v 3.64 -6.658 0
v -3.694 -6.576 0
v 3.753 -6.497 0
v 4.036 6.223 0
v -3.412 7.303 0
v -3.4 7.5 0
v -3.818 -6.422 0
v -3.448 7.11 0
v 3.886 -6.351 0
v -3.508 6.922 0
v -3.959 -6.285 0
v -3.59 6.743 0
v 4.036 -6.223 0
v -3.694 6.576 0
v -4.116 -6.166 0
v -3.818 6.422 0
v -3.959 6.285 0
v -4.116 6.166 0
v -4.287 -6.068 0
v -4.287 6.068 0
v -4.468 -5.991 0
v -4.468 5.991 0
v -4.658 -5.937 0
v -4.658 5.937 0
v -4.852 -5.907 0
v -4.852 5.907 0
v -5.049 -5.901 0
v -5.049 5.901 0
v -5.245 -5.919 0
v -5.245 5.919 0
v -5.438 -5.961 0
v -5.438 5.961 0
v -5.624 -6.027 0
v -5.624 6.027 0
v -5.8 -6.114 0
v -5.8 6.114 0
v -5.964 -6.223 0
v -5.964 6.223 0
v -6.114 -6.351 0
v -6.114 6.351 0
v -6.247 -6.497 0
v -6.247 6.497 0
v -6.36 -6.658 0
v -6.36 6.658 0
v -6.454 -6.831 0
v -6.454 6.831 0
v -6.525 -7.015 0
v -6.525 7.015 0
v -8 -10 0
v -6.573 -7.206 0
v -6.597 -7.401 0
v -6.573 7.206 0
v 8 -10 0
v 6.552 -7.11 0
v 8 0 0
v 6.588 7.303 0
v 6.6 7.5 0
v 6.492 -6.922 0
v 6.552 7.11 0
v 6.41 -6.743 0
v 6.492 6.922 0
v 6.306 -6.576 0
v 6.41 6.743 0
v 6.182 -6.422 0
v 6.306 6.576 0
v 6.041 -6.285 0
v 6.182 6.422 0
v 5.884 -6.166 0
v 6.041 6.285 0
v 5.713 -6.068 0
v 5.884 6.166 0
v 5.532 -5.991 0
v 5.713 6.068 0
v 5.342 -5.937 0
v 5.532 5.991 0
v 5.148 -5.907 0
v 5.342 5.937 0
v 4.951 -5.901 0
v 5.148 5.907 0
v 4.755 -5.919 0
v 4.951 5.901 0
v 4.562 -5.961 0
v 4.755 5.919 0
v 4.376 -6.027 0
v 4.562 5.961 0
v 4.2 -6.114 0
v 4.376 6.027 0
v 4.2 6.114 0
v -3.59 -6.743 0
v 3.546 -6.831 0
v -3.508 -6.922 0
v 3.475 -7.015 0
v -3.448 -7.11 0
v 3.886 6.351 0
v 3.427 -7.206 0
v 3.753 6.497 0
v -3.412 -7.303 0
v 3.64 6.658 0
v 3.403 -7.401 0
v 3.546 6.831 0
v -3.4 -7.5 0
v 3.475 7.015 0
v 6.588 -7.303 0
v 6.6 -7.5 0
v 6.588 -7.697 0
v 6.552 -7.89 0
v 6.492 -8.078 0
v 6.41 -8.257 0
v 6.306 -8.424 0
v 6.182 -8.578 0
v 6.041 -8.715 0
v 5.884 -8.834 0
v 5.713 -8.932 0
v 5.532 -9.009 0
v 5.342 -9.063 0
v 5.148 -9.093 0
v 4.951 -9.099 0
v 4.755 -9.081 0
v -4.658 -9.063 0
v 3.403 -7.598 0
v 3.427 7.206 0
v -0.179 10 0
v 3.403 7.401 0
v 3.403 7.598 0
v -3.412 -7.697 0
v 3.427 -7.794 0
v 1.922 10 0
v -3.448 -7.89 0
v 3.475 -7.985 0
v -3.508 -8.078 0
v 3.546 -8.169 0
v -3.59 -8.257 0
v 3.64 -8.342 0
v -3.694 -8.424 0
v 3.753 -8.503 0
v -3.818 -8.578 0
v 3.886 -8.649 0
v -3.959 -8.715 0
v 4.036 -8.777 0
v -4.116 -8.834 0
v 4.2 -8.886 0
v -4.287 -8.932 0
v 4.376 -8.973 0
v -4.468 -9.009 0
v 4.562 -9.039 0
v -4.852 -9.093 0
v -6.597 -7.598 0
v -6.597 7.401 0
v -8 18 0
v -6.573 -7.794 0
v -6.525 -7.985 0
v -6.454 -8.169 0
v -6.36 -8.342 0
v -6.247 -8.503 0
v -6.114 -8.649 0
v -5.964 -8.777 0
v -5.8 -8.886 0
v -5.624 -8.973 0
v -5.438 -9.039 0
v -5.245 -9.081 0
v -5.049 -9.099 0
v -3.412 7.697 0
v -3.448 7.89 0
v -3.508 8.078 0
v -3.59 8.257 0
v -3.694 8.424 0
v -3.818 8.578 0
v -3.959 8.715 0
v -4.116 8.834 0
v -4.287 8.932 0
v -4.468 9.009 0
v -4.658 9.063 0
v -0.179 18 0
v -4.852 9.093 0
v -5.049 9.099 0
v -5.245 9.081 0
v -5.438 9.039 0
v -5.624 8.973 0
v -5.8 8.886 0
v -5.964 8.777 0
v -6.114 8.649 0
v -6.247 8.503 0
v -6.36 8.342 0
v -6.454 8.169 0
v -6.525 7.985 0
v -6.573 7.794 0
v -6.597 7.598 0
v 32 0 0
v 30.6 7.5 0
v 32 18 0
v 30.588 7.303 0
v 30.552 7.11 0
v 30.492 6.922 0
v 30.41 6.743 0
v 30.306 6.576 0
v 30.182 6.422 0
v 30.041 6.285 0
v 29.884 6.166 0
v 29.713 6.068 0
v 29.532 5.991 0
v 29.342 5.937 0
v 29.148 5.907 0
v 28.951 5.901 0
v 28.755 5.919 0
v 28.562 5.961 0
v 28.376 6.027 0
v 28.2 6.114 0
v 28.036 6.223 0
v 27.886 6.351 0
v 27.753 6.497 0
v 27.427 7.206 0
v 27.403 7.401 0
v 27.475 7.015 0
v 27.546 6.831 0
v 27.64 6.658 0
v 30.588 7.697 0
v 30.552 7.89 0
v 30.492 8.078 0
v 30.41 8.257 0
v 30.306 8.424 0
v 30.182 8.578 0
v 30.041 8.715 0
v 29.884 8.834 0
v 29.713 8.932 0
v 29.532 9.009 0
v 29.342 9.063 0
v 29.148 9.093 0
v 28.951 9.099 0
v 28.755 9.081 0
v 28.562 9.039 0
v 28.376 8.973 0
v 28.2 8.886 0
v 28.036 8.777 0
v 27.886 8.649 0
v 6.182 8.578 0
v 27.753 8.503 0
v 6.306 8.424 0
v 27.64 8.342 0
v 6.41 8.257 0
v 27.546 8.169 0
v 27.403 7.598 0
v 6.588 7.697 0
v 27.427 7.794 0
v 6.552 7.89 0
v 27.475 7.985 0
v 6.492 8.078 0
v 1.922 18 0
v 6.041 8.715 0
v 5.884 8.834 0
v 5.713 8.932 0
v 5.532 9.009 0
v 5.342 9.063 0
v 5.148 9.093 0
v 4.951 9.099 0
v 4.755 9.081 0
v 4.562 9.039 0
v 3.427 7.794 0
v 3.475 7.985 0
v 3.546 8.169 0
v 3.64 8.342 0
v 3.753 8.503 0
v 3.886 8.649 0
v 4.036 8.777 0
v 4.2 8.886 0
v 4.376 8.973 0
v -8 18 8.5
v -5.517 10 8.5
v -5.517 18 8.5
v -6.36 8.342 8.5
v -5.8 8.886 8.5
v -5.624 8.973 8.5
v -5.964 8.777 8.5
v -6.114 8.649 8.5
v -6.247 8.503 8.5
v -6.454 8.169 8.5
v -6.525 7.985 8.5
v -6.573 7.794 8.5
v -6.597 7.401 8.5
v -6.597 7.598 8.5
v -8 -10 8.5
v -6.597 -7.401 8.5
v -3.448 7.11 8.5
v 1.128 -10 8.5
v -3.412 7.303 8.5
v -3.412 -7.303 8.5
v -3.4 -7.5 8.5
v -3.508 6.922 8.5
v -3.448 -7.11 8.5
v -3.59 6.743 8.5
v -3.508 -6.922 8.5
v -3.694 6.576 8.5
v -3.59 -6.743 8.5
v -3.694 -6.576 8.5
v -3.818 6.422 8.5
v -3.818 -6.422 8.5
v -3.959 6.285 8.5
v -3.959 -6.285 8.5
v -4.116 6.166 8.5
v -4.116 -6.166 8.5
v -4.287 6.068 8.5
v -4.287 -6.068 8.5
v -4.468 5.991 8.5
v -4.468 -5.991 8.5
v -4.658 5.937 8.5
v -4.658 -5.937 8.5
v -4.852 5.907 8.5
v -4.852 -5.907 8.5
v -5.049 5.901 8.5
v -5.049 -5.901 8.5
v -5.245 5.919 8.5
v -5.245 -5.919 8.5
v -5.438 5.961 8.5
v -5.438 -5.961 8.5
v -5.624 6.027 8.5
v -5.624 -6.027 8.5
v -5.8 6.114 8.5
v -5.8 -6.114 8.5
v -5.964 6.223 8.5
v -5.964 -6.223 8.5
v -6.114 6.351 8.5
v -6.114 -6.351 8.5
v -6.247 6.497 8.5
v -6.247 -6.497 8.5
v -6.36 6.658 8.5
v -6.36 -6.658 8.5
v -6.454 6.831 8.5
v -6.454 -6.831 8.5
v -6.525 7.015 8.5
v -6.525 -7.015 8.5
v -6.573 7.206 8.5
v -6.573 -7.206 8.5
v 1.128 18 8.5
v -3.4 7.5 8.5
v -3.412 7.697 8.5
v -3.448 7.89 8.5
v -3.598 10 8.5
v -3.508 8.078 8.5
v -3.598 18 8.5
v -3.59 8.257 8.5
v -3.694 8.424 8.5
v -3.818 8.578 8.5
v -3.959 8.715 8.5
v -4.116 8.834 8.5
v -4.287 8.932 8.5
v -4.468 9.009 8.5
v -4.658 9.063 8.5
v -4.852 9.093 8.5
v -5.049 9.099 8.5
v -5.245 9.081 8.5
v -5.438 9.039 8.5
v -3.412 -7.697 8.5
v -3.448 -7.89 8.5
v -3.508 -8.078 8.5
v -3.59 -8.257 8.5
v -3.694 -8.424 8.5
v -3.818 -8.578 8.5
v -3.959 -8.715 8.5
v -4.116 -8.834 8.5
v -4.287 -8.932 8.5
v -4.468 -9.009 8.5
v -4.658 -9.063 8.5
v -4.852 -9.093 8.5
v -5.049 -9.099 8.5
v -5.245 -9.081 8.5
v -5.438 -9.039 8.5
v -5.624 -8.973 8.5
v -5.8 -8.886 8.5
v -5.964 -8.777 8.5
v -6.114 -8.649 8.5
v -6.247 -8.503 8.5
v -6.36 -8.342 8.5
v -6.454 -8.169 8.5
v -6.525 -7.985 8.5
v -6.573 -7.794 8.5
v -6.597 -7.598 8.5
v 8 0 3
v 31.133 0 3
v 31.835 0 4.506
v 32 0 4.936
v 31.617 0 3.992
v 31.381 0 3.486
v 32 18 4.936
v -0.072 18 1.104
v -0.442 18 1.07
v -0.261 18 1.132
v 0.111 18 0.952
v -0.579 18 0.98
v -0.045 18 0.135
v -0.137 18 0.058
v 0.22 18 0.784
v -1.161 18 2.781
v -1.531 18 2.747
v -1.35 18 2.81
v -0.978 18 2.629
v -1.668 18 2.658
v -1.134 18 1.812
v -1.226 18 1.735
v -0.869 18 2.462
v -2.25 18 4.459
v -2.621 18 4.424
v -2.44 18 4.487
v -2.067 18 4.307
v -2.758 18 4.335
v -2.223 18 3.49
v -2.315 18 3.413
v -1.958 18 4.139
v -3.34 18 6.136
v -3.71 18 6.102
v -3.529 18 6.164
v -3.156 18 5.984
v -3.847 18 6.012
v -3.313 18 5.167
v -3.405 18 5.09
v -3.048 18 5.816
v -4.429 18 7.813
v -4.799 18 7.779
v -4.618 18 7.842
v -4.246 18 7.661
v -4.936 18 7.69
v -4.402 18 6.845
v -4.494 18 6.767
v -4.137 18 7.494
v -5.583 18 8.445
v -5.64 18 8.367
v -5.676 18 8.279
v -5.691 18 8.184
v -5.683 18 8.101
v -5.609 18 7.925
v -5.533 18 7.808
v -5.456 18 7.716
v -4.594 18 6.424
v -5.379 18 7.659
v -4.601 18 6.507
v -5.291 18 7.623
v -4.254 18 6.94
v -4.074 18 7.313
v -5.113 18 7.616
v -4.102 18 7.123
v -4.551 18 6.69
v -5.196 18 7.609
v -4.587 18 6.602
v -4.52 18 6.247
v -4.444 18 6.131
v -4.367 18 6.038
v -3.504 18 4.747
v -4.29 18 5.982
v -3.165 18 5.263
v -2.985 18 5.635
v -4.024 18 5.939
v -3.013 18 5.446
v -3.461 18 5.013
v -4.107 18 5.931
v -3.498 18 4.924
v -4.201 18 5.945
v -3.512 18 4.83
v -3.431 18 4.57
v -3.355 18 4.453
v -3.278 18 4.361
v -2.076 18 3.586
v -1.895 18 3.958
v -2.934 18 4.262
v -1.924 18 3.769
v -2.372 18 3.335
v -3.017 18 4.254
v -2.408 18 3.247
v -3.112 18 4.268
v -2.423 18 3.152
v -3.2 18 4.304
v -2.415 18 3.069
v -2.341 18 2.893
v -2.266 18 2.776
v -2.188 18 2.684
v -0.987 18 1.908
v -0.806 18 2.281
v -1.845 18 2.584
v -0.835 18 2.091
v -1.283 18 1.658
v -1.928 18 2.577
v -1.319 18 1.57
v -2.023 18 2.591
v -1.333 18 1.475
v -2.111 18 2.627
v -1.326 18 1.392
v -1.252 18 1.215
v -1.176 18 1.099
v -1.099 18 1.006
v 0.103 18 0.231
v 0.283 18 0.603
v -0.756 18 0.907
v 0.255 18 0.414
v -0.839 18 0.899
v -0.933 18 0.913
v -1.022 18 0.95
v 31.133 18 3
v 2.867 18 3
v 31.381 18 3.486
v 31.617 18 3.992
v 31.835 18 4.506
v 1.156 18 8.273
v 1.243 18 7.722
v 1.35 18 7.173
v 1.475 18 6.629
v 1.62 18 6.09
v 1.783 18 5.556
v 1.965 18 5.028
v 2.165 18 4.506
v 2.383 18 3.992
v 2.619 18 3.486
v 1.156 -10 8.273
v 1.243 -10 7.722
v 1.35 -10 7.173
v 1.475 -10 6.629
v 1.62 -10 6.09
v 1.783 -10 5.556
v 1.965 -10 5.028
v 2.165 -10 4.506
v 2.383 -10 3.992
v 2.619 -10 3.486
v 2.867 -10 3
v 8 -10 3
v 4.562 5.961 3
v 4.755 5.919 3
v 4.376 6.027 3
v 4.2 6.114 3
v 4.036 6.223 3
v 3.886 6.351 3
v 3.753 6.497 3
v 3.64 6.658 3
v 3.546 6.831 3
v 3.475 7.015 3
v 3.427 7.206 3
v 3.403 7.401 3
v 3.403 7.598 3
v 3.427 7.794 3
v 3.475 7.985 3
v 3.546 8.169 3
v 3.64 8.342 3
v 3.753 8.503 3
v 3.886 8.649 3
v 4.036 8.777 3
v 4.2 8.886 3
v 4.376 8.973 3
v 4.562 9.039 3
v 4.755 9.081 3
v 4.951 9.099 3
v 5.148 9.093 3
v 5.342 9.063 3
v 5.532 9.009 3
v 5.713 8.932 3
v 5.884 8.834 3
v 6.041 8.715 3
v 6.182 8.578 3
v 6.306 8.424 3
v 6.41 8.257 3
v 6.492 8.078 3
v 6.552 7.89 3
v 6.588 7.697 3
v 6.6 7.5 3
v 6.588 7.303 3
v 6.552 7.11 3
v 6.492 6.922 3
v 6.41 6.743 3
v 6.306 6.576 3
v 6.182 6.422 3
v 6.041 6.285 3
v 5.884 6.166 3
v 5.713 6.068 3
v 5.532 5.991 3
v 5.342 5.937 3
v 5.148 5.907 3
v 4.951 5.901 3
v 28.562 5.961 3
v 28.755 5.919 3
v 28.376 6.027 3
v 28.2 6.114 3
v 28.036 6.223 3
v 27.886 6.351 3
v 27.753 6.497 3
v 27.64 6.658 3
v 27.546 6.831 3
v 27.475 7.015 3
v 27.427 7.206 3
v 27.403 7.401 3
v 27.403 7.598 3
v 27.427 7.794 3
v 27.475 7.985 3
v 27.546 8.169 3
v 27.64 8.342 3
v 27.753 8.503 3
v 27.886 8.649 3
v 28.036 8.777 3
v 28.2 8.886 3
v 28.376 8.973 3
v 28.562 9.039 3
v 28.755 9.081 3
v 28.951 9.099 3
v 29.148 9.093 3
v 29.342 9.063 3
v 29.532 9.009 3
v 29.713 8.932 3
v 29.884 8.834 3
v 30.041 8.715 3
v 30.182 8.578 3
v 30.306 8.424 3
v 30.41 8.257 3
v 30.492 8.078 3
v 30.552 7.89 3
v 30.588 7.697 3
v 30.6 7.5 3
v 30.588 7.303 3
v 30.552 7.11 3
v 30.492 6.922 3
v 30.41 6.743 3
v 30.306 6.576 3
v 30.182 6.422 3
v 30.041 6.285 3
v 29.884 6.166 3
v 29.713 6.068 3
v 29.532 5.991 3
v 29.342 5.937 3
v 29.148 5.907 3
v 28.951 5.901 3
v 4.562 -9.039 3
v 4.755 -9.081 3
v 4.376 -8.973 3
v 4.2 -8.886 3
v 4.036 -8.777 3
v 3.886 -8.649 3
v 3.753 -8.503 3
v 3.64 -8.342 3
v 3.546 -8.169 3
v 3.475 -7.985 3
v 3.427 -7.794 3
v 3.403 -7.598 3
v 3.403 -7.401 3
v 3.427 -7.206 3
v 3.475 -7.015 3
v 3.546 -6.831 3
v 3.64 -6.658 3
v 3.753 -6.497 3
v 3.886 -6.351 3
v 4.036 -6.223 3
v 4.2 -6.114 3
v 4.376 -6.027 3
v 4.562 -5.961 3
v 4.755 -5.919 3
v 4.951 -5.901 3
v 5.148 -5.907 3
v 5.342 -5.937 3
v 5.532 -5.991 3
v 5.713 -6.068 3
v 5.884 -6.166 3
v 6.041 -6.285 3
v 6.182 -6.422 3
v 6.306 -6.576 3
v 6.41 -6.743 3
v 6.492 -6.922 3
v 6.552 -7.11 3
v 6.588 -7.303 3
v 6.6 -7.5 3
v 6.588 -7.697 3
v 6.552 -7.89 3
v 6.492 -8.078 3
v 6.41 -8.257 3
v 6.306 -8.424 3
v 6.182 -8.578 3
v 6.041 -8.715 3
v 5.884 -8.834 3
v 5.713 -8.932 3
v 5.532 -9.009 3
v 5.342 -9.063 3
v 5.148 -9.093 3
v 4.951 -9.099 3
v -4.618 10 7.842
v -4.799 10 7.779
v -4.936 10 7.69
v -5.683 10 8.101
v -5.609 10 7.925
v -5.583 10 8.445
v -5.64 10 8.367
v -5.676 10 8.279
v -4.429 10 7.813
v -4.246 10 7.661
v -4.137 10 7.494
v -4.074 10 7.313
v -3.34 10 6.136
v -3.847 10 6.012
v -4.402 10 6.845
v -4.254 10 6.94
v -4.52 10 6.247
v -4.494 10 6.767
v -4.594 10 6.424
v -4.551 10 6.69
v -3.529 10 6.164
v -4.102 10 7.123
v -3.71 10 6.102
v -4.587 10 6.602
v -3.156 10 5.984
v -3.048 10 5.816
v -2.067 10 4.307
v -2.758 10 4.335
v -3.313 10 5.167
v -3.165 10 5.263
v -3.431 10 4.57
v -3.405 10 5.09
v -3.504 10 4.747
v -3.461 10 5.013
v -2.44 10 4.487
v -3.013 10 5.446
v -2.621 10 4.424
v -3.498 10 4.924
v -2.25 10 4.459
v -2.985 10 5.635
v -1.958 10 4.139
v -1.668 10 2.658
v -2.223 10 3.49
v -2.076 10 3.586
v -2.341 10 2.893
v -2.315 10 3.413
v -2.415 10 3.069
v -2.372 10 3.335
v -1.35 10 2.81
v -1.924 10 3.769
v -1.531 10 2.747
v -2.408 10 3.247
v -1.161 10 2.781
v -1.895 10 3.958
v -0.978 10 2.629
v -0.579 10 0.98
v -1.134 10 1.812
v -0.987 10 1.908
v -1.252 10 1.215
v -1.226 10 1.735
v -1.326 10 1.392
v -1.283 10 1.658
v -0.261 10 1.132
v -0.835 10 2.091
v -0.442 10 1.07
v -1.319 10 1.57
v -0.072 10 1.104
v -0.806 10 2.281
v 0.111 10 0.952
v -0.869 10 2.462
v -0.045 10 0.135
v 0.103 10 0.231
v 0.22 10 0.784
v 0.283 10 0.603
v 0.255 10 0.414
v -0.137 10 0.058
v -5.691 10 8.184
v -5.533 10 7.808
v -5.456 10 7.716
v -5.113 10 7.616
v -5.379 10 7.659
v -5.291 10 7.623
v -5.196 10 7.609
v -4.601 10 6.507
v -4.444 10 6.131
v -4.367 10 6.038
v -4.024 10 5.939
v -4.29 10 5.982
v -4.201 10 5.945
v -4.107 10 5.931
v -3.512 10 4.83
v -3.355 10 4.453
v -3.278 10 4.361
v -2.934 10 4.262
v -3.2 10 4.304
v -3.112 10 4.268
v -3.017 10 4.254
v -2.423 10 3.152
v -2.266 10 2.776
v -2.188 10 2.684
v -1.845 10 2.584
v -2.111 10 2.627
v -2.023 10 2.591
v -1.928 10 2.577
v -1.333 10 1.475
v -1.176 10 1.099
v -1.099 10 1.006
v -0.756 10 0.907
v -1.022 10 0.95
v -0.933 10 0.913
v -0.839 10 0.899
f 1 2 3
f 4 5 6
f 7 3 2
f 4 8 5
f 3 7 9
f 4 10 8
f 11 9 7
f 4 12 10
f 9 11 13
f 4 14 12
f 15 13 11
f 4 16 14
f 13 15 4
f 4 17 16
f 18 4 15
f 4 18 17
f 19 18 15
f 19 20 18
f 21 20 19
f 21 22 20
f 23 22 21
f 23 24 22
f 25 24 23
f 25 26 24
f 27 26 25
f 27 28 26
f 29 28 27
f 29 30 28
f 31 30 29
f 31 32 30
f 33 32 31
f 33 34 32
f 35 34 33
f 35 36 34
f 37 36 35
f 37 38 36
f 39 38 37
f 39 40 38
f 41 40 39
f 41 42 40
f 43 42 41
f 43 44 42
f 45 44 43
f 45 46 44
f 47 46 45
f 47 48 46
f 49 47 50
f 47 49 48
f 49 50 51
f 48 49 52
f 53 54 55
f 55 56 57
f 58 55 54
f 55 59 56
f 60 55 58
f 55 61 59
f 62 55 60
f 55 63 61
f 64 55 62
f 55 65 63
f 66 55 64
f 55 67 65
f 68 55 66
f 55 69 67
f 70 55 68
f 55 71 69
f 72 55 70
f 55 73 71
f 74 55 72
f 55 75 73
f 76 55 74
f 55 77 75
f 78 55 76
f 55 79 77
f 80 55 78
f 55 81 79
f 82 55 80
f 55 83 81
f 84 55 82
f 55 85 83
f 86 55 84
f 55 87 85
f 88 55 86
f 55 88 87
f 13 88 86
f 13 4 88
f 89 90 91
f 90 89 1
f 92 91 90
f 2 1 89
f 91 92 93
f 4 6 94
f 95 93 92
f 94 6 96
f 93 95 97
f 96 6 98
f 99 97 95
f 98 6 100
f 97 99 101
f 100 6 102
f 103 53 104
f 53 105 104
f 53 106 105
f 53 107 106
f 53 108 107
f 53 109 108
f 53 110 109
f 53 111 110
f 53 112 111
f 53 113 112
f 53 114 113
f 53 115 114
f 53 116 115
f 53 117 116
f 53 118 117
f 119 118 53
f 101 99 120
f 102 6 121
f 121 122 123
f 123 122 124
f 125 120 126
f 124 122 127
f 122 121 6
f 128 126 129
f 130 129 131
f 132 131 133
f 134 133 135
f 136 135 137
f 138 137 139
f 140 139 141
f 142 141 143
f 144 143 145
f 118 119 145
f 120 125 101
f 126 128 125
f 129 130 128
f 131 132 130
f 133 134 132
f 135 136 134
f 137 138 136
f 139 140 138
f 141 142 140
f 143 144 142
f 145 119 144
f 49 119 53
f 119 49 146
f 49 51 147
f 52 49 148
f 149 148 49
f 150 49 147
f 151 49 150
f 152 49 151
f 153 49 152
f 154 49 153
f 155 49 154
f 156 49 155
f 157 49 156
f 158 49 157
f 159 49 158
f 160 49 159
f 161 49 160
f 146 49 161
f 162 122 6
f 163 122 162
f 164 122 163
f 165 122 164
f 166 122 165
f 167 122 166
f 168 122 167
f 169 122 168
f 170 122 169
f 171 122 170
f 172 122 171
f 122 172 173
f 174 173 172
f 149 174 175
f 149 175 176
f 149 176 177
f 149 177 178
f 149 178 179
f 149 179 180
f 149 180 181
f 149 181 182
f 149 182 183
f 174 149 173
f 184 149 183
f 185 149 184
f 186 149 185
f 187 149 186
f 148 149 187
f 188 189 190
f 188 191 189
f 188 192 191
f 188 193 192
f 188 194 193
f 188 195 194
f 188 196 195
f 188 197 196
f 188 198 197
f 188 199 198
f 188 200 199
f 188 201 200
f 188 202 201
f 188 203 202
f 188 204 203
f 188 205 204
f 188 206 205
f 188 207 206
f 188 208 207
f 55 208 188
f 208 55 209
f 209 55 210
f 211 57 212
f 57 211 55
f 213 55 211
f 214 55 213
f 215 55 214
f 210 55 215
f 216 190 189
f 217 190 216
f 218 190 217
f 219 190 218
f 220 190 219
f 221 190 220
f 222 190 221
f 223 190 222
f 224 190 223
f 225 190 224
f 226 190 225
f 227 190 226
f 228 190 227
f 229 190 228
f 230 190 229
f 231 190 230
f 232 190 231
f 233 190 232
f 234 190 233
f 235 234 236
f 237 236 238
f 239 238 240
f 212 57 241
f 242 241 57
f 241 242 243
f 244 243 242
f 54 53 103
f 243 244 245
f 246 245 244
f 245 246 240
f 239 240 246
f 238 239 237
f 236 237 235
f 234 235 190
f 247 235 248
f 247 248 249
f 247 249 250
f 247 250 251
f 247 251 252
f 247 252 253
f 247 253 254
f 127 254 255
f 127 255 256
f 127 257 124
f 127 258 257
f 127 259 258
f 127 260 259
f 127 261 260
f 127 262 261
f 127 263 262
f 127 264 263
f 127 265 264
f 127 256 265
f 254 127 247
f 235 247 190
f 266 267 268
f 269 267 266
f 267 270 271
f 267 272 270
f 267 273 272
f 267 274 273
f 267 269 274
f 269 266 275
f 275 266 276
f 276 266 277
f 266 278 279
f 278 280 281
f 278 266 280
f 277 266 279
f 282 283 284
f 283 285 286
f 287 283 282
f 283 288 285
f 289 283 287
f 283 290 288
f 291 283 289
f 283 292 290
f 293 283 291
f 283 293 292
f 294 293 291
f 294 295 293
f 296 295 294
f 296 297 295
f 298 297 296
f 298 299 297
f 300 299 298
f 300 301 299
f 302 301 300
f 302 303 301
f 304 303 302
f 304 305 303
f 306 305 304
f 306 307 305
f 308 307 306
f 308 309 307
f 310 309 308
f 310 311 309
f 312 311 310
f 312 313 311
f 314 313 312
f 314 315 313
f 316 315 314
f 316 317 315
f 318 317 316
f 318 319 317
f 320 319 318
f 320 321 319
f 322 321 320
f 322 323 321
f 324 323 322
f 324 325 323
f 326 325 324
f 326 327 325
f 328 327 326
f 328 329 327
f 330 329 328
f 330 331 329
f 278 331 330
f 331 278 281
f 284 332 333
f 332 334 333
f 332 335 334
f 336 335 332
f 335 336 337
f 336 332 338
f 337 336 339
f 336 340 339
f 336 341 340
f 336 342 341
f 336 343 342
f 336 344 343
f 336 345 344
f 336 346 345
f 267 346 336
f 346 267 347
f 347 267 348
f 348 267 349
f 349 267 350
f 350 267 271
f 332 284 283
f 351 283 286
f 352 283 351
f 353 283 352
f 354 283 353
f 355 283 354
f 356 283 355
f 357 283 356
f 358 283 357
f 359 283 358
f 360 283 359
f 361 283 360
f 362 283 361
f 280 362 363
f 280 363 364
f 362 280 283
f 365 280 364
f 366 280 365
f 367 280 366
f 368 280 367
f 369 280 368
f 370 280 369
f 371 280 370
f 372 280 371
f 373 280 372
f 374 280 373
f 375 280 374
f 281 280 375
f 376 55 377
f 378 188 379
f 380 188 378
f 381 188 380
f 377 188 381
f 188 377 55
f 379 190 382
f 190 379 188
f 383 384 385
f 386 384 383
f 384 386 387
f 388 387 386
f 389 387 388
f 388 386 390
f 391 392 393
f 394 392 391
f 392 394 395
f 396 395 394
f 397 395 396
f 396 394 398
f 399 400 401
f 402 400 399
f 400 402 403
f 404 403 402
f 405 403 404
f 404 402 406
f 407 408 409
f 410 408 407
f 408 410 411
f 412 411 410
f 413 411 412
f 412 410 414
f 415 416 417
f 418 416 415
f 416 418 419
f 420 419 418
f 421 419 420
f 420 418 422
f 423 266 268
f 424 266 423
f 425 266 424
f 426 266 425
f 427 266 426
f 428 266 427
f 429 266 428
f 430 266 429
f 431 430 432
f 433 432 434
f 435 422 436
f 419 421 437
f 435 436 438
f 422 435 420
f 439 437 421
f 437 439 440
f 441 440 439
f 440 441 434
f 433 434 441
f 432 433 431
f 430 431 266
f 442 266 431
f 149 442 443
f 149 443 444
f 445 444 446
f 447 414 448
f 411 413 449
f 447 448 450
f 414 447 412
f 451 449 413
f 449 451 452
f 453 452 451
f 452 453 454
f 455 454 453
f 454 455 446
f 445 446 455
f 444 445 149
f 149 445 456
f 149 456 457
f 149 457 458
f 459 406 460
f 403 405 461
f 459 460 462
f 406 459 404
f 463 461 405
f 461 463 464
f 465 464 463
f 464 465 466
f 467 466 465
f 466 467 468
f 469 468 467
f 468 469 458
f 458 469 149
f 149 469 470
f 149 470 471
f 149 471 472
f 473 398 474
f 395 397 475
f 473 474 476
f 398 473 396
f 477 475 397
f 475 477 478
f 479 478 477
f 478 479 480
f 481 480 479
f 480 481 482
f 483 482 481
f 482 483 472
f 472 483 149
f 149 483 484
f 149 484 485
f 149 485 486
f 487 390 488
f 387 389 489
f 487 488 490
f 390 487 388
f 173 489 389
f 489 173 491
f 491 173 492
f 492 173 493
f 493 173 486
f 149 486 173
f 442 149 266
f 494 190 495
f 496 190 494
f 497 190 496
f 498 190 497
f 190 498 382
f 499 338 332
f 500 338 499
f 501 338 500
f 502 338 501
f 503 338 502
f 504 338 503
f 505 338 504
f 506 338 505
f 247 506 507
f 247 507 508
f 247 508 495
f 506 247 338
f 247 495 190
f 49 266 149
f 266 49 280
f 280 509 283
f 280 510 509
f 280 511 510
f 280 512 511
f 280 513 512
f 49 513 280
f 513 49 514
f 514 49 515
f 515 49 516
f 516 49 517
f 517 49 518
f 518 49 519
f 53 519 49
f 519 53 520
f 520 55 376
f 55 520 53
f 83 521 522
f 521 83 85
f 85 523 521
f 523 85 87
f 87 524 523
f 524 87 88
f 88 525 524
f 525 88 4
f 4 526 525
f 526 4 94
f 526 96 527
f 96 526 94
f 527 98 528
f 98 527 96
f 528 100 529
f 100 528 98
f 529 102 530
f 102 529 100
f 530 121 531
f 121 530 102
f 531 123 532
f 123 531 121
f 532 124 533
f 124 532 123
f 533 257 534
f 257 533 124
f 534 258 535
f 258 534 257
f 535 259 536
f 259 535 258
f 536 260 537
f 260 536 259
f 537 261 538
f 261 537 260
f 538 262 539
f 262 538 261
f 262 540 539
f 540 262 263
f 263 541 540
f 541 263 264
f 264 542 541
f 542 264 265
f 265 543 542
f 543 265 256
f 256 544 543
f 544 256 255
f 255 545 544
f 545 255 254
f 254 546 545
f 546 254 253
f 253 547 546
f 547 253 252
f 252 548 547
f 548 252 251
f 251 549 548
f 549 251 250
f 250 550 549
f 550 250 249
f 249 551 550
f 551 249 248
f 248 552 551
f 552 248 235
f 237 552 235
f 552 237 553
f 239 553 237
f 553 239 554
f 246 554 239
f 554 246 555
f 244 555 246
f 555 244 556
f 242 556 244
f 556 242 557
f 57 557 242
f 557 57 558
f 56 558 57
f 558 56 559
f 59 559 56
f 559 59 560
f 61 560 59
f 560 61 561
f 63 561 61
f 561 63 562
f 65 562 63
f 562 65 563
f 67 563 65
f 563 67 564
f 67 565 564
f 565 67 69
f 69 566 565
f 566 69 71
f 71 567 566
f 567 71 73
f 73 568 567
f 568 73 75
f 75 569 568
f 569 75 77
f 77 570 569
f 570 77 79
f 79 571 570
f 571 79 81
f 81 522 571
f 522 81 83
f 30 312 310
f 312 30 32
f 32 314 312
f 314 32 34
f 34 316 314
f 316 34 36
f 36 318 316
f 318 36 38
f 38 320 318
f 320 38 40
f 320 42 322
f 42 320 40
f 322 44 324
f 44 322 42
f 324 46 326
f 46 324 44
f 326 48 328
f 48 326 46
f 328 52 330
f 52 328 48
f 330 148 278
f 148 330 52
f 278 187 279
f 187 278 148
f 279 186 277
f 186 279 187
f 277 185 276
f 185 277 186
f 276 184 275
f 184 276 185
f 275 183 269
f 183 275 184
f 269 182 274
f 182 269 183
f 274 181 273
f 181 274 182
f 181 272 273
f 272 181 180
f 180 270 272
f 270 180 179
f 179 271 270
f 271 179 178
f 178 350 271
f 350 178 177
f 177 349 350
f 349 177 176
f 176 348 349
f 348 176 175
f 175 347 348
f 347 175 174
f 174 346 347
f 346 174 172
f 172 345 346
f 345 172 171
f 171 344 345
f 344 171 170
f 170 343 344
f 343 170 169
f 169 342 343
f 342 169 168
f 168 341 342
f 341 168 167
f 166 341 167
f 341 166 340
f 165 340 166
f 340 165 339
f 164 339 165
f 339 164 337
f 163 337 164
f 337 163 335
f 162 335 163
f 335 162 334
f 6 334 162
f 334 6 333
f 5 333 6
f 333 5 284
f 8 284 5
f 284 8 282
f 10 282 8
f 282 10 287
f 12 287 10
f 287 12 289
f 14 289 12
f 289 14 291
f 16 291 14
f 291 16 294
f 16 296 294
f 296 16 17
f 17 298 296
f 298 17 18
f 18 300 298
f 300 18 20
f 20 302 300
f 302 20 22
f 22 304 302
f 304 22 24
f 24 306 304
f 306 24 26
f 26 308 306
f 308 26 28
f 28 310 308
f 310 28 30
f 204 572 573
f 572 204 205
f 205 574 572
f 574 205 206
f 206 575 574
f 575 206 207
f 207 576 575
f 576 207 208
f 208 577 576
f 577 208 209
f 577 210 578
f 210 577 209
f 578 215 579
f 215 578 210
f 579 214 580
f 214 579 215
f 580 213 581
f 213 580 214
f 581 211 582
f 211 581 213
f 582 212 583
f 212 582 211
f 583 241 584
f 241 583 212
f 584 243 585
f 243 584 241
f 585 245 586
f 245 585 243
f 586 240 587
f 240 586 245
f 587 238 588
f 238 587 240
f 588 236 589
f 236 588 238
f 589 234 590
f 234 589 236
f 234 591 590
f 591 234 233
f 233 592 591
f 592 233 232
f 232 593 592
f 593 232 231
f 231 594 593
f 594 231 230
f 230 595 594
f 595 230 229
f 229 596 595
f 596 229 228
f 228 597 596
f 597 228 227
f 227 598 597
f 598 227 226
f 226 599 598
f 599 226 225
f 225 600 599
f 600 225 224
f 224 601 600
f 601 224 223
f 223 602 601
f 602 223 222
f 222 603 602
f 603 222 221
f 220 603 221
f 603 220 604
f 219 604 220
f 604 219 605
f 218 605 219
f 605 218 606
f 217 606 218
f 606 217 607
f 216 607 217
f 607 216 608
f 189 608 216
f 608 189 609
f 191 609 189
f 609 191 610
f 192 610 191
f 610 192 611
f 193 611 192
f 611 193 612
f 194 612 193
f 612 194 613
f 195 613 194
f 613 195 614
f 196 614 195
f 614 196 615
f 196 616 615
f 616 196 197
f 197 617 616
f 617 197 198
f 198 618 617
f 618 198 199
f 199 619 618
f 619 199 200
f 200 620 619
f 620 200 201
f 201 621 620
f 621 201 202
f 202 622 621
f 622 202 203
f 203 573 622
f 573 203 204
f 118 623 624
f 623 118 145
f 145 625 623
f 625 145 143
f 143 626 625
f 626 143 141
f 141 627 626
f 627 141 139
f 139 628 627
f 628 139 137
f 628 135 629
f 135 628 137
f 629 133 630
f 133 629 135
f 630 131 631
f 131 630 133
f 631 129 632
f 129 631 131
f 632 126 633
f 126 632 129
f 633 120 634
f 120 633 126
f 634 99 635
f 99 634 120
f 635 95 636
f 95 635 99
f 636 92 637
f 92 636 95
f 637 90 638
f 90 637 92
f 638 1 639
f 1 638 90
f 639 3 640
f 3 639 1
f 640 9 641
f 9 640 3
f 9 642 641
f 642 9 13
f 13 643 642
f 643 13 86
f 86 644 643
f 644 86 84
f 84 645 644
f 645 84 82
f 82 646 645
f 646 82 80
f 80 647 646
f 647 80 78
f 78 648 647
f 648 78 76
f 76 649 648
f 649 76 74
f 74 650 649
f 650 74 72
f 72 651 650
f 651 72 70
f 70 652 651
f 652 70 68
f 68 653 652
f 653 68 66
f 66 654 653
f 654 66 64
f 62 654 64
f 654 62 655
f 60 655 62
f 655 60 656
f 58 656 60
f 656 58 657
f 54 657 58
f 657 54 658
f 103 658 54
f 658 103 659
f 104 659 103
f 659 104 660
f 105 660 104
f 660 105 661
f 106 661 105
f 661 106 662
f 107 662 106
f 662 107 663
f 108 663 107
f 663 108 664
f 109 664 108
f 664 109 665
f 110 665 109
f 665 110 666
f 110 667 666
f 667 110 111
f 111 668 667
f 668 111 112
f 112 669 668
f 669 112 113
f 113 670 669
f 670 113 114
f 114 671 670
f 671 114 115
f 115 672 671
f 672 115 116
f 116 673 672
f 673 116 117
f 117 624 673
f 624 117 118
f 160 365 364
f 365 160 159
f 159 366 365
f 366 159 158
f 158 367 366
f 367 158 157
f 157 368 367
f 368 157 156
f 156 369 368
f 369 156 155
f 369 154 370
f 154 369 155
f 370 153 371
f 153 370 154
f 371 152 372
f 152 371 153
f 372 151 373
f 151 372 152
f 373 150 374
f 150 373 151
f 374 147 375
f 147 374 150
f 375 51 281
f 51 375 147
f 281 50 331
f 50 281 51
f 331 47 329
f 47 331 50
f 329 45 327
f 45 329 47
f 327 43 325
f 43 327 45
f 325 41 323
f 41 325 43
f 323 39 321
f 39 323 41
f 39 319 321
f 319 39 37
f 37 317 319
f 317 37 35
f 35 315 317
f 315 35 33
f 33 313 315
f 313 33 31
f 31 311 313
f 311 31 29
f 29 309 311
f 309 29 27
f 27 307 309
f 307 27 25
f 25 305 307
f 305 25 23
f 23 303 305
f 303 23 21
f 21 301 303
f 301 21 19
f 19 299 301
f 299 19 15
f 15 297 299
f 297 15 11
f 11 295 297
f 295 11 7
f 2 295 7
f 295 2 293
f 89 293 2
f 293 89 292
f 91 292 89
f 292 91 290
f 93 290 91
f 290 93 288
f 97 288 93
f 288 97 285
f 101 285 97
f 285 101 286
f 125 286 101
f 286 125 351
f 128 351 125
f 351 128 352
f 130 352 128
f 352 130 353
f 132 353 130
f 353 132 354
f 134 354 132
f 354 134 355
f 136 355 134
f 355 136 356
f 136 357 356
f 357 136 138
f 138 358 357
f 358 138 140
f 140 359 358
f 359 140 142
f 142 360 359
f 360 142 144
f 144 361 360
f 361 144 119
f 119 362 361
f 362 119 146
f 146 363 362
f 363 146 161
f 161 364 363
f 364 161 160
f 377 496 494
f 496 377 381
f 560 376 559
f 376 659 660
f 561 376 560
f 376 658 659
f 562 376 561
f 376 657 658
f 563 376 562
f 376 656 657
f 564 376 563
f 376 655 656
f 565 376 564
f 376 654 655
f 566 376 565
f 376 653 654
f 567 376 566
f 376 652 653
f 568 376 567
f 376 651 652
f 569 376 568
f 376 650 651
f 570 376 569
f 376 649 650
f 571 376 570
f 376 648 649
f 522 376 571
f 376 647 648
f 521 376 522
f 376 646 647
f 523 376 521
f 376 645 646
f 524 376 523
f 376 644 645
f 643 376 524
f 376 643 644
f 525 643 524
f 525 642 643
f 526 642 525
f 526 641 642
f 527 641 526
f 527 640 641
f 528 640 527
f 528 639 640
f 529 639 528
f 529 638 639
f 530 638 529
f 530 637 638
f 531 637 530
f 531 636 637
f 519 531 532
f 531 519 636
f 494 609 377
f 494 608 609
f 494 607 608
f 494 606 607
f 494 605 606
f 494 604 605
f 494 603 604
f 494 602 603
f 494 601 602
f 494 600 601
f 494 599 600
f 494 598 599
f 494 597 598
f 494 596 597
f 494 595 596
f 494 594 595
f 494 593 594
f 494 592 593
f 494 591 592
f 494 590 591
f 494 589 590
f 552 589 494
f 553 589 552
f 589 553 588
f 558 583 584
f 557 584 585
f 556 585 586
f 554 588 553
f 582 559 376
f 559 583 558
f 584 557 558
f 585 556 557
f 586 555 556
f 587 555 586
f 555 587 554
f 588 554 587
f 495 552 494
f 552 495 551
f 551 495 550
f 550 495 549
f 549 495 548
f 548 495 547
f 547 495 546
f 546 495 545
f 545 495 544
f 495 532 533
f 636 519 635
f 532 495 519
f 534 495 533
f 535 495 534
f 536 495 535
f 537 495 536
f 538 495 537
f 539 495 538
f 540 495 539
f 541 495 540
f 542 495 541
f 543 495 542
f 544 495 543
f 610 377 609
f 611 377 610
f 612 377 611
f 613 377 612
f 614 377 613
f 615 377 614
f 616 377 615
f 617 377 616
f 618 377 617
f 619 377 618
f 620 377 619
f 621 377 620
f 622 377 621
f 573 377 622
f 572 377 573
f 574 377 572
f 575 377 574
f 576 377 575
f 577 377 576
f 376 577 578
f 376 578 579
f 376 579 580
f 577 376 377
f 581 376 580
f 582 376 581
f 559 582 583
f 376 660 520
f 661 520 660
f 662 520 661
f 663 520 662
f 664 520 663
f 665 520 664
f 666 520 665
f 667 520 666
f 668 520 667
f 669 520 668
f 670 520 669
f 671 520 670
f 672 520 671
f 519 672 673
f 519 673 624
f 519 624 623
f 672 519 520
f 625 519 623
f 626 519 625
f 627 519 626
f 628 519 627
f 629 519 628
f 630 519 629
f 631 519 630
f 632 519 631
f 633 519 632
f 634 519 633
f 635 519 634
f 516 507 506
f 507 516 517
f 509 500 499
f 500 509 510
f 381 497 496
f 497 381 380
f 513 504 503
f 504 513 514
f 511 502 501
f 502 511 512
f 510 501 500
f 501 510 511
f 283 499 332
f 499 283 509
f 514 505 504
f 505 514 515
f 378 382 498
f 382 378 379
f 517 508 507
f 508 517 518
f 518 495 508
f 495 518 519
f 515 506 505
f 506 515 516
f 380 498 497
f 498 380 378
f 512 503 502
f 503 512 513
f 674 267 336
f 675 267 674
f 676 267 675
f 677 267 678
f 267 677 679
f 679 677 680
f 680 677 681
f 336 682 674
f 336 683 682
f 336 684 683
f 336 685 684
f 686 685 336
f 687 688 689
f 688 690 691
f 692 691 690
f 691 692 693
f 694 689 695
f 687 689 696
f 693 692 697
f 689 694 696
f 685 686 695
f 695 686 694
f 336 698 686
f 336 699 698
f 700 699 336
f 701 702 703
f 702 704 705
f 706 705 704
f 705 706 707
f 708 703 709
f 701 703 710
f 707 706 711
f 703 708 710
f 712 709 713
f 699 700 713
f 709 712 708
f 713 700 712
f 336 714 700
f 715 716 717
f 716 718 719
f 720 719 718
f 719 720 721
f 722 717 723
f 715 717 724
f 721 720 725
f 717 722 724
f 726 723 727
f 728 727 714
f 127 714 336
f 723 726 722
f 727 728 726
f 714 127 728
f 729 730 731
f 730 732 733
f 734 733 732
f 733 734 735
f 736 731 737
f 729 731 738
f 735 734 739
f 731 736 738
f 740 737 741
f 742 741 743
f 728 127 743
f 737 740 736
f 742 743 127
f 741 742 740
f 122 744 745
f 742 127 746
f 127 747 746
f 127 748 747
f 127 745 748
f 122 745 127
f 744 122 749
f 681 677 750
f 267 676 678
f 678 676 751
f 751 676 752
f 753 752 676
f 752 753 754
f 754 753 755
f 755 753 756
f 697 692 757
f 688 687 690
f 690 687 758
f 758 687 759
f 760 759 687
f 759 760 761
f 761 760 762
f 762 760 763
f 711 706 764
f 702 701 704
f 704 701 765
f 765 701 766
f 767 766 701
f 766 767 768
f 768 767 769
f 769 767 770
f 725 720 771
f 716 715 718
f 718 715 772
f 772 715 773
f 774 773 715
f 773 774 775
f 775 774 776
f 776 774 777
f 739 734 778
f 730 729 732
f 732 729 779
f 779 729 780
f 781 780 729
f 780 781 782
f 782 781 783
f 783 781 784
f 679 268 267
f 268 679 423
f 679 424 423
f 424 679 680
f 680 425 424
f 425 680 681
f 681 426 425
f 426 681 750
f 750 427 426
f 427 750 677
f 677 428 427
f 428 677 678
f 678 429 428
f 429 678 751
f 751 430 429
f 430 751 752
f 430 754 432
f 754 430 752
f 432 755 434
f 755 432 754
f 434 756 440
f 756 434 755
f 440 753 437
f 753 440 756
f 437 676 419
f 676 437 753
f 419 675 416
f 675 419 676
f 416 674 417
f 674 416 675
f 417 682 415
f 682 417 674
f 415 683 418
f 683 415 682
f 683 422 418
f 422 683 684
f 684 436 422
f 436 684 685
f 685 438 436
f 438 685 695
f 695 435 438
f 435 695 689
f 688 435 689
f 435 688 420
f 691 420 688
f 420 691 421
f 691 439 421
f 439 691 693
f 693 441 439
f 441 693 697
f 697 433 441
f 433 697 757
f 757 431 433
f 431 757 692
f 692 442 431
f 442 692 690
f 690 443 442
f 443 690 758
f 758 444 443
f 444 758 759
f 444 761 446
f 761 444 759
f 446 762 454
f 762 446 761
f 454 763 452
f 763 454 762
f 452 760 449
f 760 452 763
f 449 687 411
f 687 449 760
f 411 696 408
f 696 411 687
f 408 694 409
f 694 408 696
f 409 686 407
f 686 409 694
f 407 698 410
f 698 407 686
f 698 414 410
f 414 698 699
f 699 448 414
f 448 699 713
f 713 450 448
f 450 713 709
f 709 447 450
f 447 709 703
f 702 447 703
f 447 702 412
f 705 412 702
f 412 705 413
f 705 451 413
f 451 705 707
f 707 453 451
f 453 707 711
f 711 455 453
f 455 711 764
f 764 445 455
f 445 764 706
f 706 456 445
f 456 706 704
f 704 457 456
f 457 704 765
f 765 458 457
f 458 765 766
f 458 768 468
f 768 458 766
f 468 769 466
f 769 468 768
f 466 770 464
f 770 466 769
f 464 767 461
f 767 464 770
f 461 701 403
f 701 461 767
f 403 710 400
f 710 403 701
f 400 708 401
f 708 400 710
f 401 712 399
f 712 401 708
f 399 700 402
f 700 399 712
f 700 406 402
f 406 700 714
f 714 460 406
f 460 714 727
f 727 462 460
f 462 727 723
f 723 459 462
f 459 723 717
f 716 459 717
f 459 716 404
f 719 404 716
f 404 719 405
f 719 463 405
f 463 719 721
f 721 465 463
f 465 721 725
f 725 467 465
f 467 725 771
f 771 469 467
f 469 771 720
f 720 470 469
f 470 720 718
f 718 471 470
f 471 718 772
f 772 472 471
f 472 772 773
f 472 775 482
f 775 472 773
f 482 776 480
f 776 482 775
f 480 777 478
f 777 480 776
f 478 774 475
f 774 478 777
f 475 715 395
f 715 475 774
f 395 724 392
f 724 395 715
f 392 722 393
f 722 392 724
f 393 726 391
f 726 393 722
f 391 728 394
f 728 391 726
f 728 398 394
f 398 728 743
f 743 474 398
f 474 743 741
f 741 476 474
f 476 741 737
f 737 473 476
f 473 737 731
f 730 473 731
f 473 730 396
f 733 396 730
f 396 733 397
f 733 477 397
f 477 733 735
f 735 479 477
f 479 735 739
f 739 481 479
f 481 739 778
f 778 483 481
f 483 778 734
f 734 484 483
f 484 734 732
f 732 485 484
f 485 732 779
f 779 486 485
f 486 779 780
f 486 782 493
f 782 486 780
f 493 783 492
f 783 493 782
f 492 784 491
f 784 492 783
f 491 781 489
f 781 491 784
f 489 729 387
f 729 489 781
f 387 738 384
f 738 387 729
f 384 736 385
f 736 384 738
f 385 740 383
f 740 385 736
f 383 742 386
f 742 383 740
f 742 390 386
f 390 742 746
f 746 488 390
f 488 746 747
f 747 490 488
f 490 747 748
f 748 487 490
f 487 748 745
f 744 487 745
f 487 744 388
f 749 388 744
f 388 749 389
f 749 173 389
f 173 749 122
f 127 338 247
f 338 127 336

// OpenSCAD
$fs = .2;
$fa = 2;

difference() {
	linear_extrude(8.5, convexity = 5) difference() {
		union() {
			square([16, 20], center = true);
			translate([-8, 0, 0]) square([32 + 8, 10 + 8]);
		}
		for(x = [1, -1], y = [1, -1]) translate([x * 5, y * 7.5, 0]) circle(3/2 + .1);
		for(x = [1, -1]) translate([5 + 12 + x * 12, 7.5, 0]) circle(3/2 + .1);
	}
	translate([5 + 12, 5 + 4, 15 / 2 + 3]) rotate([90, 0, 0]) linear_extrude(100, center = true) intersection() {
		circle(16);
		square([32, 15], center = true);
	}
	translate([4, 18, -3.2]) rotate([90, -90 - 33, 0]) linear_extrude(16, center = true, convexity = 5) offset(-.4) offset(.8) offset(-.4) {
		for(i = [0:20]) translate([i * 2, 0, 0]) square([1, 2]);
		square([40, 1]);
	}
}
